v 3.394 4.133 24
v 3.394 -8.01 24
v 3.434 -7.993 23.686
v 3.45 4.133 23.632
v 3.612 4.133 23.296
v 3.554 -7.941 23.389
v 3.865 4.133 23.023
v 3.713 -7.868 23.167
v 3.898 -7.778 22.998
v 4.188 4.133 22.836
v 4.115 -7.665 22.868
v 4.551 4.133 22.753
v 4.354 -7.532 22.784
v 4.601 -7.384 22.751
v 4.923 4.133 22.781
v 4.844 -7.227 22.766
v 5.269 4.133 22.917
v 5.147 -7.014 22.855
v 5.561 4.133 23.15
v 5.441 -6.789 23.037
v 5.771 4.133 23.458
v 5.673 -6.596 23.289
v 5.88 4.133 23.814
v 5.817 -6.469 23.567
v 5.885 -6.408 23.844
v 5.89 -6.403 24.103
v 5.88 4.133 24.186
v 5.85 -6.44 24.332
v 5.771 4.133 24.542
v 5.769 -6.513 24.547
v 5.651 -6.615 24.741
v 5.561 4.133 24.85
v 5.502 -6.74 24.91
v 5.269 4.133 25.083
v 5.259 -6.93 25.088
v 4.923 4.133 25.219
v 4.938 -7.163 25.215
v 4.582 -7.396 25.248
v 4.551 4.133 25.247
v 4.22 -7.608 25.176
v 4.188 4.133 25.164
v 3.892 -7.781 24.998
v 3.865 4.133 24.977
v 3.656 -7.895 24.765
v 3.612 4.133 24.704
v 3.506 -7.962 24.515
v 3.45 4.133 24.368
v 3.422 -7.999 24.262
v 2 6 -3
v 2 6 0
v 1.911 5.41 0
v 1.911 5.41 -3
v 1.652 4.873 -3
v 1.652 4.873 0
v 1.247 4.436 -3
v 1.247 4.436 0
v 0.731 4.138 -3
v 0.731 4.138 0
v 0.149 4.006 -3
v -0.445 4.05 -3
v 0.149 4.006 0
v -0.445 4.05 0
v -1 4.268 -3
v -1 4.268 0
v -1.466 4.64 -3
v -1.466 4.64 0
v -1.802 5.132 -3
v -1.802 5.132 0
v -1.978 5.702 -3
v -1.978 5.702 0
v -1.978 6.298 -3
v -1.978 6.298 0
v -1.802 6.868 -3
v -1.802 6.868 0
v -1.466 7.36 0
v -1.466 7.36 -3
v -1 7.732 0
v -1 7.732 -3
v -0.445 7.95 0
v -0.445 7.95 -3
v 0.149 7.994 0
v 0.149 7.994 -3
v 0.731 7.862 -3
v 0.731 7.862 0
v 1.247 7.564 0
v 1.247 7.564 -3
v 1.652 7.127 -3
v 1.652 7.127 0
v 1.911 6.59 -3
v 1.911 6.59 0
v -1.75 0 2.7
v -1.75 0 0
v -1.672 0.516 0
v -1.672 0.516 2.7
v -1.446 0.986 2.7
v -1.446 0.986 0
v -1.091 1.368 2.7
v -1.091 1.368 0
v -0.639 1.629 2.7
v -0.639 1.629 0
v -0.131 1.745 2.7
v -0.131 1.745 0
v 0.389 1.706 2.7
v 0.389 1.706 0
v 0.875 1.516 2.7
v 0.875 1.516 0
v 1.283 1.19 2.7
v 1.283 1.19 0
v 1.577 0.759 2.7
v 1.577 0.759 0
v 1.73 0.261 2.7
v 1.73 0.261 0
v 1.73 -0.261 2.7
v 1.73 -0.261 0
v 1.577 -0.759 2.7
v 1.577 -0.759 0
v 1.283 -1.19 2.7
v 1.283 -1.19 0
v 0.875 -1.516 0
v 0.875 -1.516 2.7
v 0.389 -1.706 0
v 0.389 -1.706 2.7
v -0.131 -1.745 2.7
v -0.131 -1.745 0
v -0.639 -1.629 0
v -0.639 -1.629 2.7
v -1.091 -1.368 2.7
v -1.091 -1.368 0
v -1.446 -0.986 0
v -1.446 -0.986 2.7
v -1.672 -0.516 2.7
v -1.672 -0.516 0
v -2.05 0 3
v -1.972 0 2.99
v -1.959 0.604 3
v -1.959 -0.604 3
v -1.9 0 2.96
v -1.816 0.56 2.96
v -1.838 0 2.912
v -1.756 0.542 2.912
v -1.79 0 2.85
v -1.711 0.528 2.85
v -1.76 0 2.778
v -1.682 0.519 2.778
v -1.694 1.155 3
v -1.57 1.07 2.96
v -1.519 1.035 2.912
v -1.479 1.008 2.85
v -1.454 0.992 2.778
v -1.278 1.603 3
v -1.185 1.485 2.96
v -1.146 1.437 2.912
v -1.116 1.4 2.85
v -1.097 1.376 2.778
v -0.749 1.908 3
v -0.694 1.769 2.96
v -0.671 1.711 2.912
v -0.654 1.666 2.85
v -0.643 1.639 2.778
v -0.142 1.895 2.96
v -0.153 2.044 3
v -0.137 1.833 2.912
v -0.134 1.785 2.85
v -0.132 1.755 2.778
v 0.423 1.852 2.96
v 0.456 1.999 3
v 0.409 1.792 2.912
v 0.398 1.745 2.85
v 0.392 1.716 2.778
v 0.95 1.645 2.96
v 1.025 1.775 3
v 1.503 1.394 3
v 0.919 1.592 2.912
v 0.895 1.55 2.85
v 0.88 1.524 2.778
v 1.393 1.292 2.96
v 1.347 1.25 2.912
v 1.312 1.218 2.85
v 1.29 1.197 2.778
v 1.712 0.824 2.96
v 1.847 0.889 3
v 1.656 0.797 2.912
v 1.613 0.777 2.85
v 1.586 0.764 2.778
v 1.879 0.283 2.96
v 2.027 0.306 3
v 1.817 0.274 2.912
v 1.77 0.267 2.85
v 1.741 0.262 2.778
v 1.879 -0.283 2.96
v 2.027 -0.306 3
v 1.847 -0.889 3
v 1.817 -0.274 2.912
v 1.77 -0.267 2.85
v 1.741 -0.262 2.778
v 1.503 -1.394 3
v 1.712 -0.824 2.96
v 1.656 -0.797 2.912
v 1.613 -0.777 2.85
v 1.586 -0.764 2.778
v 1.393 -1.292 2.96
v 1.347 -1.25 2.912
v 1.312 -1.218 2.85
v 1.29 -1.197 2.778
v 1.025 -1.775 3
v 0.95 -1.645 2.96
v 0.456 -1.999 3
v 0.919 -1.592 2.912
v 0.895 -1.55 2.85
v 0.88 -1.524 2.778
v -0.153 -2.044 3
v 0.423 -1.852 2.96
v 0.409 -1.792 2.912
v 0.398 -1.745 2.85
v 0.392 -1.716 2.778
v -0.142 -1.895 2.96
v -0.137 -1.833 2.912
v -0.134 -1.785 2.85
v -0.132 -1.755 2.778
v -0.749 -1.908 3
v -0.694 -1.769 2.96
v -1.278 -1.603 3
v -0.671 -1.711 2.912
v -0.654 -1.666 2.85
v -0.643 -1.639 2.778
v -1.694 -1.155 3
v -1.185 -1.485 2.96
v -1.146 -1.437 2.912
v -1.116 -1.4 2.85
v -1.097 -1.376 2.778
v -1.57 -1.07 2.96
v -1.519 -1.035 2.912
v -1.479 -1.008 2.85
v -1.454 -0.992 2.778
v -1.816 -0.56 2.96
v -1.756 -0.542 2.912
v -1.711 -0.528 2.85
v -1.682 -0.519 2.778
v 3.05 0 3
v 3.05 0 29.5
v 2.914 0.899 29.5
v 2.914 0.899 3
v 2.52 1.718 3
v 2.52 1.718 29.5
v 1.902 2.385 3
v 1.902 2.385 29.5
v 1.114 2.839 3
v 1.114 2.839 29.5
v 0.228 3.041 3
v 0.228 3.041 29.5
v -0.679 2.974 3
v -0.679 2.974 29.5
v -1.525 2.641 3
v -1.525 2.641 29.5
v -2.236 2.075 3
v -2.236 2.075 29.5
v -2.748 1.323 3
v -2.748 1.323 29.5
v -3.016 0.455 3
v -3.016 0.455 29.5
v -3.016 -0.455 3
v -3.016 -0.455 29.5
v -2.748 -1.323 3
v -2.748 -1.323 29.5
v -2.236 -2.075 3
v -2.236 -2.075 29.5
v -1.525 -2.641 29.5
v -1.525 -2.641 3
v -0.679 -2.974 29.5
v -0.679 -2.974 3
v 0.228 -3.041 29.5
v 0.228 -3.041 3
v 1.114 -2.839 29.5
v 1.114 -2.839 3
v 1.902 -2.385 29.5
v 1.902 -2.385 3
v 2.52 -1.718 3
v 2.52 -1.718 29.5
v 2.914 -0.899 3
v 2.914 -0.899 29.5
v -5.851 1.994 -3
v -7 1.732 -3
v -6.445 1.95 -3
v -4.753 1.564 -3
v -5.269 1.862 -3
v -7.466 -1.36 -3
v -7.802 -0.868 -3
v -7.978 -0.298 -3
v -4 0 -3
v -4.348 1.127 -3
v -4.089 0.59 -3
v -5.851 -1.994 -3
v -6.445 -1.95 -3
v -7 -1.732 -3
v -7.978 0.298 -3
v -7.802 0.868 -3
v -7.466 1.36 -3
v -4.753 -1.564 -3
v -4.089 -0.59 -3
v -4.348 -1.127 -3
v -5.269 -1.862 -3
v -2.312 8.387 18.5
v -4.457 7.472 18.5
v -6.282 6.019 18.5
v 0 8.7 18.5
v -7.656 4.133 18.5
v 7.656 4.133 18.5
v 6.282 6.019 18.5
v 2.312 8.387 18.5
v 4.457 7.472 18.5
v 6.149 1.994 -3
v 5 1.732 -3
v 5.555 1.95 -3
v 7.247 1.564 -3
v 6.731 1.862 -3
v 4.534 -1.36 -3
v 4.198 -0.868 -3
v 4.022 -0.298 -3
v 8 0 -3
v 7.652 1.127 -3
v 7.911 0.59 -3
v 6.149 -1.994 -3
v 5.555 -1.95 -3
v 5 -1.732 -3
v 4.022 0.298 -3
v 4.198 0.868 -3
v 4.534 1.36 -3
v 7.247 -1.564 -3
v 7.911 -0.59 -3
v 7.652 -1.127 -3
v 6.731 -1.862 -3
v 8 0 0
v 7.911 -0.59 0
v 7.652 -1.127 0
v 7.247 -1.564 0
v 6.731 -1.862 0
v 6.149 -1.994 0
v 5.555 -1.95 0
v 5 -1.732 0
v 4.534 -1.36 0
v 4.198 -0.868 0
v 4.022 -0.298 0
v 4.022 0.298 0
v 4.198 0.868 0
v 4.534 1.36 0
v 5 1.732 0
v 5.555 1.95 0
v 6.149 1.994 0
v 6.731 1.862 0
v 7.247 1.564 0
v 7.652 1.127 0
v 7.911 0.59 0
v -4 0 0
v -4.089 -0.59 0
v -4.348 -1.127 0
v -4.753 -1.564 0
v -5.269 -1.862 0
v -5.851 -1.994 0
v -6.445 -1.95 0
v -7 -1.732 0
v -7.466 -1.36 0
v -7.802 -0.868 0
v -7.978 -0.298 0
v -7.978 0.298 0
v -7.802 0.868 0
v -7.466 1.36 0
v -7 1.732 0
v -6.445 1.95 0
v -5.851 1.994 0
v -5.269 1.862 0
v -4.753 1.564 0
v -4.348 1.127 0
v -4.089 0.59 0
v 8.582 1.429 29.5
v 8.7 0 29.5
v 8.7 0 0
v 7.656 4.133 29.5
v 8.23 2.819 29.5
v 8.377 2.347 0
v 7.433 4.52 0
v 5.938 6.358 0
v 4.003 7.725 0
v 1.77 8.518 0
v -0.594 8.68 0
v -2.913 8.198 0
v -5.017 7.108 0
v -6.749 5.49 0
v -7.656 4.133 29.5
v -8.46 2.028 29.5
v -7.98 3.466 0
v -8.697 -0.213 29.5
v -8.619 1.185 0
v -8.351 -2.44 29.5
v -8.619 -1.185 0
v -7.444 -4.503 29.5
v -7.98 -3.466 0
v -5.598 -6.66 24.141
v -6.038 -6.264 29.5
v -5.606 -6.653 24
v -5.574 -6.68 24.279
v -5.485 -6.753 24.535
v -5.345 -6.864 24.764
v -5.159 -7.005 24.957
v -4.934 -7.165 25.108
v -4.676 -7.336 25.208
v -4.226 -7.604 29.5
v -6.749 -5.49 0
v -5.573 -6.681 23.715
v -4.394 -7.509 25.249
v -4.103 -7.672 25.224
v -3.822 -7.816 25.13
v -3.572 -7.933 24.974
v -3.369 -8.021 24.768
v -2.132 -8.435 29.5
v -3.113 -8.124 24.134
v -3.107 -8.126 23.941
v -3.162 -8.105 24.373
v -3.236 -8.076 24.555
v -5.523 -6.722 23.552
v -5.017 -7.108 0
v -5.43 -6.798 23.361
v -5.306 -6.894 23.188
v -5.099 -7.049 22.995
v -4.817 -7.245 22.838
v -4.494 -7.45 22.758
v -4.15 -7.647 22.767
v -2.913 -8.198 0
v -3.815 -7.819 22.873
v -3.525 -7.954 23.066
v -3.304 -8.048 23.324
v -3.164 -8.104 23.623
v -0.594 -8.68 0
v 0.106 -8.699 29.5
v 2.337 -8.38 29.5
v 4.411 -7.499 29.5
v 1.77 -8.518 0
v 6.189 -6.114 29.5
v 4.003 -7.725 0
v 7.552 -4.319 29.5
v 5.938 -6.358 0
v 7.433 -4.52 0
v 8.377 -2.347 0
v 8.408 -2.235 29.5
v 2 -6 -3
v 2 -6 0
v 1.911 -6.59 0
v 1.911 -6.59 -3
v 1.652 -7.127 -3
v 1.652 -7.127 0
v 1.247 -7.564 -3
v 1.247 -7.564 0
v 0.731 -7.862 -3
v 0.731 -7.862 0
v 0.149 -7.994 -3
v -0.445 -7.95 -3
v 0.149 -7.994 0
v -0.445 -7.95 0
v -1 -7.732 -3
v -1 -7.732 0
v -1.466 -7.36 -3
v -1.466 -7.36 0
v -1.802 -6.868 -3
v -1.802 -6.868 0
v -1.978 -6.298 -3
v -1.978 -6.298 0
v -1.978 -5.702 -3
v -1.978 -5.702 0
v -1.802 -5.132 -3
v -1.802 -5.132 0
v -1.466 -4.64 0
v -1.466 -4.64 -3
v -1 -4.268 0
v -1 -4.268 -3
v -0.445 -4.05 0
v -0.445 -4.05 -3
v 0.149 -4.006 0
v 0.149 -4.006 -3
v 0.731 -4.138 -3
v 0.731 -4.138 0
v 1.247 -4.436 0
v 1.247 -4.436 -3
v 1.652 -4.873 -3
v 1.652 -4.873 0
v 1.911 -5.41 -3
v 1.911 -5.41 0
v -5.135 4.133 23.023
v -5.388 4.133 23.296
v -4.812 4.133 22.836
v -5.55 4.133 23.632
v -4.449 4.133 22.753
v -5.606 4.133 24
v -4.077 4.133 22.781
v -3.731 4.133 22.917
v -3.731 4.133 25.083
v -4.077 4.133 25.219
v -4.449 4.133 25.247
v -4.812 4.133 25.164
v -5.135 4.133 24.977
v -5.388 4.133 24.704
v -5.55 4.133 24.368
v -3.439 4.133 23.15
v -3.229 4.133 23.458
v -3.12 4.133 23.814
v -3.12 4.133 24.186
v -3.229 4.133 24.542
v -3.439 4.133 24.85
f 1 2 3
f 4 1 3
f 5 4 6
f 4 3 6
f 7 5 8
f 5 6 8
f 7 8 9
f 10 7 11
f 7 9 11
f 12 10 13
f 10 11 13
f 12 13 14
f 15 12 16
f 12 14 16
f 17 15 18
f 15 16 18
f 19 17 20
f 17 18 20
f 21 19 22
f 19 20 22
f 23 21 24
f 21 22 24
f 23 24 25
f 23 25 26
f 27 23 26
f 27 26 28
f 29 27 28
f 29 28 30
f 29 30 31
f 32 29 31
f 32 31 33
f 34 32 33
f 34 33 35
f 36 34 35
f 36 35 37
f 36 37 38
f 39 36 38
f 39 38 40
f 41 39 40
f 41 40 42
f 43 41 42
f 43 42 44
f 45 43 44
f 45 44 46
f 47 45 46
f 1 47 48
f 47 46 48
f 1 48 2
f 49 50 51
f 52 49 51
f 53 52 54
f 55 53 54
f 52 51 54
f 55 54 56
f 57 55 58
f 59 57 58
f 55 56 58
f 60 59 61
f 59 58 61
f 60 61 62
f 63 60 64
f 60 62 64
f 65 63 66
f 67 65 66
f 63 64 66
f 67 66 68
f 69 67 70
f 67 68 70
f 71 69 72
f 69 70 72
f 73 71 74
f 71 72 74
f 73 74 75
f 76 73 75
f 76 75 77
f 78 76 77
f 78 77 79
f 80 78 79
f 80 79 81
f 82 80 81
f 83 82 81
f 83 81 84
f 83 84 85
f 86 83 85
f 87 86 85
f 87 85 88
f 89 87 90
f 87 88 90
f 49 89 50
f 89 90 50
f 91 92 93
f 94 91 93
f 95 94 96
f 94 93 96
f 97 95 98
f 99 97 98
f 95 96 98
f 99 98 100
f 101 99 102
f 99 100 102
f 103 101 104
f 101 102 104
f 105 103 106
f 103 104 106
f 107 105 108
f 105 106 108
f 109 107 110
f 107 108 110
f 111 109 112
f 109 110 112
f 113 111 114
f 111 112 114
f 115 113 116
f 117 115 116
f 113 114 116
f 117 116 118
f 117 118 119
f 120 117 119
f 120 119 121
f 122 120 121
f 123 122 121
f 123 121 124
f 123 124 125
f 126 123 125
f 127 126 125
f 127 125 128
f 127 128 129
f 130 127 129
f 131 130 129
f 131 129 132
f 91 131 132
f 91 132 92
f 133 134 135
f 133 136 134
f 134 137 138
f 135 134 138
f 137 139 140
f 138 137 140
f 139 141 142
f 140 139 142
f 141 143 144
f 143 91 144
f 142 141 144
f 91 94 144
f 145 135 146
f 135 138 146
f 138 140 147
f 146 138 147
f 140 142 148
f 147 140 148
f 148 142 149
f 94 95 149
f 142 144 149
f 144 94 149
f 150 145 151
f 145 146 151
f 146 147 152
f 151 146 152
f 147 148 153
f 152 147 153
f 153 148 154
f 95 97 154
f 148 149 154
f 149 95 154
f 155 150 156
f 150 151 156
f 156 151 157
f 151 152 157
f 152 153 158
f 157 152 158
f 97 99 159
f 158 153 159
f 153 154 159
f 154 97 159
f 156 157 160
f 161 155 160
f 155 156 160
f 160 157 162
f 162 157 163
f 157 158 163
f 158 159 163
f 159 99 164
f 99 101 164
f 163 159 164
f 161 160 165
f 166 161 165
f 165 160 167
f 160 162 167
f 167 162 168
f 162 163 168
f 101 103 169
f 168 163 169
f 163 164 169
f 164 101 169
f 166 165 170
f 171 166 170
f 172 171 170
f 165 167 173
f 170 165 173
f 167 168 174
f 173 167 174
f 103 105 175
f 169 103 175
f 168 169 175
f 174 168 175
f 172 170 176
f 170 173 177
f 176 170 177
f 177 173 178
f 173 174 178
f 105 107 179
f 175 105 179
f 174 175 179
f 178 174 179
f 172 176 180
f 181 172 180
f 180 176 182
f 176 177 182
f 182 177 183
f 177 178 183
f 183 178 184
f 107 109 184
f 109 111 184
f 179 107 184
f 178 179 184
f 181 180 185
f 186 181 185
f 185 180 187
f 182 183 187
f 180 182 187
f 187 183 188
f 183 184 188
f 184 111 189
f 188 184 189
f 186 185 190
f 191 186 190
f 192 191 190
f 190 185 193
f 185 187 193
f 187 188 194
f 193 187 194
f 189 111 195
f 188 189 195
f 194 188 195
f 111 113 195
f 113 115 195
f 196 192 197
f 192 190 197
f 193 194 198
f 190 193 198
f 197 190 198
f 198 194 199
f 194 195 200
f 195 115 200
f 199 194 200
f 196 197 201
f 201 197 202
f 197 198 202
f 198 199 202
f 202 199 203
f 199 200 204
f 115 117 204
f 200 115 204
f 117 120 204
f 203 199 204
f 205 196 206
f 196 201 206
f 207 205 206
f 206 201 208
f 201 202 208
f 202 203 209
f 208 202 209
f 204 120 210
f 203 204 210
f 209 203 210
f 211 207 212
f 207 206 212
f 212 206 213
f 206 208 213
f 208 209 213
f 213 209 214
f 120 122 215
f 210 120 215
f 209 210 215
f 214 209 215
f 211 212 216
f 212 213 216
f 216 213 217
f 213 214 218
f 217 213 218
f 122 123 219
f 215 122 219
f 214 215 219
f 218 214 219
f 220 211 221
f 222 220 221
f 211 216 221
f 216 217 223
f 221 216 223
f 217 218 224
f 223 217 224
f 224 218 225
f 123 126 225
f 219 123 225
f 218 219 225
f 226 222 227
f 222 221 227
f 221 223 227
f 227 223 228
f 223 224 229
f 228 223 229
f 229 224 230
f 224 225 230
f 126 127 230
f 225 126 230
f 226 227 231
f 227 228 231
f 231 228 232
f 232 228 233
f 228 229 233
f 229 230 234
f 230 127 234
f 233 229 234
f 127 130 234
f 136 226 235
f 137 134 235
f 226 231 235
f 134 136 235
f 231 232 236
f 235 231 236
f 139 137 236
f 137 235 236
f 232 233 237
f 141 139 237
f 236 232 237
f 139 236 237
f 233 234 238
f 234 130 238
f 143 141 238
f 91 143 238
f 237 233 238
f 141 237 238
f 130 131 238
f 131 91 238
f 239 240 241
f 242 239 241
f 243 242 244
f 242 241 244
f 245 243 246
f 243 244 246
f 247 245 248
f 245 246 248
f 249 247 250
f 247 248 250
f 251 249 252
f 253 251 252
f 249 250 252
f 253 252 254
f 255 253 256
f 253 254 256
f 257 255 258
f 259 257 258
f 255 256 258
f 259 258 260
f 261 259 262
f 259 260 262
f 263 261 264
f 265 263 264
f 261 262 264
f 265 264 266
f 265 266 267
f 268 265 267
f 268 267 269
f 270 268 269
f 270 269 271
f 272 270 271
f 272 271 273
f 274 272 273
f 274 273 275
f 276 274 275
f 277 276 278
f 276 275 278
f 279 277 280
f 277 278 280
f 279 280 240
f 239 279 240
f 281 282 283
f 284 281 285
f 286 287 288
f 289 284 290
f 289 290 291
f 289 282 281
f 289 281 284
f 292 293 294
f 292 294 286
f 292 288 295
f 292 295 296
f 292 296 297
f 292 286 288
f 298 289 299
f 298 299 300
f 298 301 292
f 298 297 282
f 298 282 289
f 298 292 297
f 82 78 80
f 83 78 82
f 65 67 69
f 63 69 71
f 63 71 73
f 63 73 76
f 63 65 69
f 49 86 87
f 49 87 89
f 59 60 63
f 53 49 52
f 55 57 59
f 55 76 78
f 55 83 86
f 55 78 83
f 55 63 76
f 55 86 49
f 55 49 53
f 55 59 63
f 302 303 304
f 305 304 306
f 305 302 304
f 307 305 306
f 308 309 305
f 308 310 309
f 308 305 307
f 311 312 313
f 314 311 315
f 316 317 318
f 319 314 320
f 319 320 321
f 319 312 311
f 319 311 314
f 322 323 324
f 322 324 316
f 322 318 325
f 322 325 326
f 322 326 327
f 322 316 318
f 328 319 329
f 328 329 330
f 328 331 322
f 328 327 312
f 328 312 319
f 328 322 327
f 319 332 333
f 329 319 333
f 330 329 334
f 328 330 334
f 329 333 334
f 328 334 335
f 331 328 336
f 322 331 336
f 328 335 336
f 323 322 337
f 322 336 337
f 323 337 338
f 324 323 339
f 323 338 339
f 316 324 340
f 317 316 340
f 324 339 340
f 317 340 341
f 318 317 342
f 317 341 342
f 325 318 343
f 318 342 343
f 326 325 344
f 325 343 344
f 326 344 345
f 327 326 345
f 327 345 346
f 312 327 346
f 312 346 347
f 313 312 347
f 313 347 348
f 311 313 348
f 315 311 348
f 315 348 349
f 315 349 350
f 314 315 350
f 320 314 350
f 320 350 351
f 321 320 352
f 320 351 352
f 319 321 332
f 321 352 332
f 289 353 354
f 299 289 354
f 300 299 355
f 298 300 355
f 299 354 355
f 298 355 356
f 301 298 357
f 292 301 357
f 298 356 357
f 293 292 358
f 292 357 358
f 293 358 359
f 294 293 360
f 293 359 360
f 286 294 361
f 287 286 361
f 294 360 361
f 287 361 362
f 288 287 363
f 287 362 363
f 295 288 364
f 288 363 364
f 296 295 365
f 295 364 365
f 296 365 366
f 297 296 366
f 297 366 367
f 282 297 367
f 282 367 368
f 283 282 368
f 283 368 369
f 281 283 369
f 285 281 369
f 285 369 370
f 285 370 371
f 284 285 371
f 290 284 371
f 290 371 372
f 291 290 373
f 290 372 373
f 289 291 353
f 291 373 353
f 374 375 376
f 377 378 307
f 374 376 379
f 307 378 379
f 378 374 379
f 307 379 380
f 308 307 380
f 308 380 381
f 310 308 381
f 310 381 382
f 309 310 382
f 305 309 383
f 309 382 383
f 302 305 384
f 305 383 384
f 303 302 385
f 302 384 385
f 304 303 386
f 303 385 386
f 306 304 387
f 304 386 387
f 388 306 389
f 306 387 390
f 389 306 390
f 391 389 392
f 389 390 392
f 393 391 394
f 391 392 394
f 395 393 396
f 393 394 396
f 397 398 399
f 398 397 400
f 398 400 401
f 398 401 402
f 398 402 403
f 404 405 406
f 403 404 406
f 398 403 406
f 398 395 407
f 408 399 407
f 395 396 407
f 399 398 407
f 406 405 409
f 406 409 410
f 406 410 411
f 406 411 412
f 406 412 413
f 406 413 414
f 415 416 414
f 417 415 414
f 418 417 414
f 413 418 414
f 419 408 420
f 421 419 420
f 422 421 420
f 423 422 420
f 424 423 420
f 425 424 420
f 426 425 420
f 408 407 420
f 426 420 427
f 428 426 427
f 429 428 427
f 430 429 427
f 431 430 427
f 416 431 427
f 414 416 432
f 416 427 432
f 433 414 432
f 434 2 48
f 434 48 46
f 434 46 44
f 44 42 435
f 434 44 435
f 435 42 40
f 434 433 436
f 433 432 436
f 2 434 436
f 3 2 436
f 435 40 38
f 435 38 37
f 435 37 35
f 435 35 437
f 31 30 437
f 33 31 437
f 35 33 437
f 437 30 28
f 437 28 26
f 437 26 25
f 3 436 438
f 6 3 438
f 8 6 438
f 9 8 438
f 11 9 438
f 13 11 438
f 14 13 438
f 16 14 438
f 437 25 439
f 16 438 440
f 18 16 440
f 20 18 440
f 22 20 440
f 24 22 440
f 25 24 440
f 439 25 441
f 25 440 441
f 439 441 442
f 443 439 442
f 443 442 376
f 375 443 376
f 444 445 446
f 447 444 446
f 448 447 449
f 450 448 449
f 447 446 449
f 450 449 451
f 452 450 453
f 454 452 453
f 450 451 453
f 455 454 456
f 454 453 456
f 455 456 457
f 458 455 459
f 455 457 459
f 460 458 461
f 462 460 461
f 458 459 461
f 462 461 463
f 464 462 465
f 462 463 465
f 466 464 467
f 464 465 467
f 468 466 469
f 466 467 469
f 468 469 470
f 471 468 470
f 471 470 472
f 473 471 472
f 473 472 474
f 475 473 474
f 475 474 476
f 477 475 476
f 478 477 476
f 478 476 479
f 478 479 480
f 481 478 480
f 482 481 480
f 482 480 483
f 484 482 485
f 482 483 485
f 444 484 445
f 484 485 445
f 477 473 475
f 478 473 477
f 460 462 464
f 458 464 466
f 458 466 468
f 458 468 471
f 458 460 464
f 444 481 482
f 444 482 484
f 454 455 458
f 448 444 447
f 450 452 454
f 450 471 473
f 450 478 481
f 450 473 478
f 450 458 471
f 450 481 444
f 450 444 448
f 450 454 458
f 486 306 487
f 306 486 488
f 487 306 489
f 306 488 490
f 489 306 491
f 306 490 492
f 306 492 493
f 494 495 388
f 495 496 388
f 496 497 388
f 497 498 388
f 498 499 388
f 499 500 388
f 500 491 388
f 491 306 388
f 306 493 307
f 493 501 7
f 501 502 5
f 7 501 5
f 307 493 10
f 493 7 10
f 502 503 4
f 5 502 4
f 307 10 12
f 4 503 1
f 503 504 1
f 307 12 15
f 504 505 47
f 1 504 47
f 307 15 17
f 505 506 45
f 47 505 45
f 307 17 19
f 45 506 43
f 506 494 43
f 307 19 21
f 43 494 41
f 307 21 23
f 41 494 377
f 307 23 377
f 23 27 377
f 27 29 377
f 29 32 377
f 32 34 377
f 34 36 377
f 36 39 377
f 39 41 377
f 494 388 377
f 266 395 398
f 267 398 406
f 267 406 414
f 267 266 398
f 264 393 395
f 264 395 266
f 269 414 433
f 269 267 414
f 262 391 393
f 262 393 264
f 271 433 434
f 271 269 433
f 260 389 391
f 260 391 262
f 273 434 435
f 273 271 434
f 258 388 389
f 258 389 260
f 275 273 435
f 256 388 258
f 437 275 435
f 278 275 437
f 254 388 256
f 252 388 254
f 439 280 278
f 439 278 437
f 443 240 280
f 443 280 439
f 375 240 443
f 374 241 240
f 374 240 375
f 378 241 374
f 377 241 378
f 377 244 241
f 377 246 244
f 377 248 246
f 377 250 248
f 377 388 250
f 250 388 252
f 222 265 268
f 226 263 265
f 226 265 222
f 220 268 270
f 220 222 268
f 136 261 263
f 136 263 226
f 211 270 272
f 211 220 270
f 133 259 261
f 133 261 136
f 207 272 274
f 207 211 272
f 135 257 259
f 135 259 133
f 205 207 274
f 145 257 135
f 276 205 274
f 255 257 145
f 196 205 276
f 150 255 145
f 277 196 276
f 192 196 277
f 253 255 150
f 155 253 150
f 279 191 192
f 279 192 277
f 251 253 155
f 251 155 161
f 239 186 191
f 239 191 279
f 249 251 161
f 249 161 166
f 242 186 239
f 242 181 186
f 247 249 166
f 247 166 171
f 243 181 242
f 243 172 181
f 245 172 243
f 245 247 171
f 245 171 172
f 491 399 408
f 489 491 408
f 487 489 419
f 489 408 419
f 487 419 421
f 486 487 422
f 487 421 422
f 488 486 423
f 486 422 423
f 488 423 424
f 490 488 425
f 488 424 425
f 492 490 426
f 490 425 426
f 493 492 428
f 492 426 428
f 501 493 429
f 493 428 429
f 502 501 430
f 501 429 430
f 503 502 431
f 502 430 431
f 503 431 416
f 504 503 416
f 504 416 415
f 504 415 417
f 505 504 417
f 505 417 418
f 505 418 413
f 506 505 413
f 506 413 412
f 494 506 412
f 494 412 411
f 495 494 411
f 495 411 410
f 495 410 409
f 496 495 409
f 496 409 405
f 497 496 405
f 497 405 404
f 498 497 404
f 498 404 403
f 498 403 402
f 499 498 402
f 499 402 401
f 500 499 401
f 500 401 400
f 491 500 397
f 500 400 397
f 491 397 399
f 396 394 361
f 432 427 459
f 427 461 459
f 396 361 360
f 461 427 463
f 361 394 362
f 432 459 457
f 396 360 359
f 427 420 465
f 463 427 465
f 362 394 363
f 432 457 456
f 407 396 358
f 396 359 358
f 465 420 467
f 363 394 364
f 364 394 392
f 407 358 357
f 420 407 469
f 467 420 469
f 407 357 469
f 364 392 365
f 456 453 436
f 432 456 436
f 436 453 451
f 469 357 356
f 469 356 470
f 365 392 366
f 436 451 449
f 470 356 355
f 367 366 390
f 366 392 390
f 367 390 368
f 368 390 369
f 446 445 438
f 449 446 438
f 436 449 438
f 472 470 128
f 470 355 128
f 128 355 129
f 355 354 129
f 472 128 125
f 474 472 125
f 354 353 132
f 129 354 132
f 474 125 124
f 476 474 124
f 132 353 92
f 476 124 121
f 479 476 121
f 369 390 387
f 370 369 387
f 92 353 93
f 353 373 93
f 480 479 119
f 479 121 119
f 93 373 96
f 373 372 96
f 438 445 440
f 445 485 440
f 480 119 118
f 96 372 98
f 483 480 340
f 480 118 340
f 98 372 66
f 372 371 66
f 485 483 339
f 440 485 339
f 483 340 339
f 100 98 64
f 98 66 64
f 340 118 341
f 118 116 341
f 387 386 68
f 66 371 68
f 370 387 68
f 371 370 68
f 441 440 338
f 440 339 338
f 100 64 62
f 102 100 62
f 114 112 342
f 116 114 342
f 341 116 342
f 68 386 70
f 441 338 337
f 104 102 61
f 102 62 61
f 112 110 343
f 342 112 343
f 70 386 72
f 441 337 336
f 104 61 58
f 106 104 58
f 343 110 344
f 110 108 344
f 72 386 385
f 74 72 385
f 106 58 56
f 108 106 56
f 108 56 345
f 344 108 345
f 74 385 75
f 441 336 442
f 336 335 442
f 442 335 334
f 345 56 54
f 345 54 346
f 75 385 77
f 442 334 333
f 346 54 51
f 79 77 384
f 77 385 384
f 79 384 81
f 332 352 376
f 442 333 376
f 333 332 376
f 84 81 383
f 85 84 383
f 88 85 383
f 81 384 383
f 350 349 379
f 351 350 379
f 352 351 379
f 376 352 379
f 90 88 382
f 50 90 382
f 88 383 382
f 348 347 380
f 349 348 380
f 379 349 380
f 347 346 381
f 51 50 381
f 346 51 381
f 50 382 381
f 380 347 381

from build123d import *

# Parameters (mm, degrees)
SKETCH1_R                   = 8.7
BOSS_EXTRUDE1_DEPTH         = 29.5
SKETCH5_R                   = 1.75
CUT_EXTRUDE1_DEPTH          = 32.962947298
SKETCH6_R                   = 3.05
CUT_EXTRUDE3_DEPTH          = 26.5
SKETCH2_W                   = 17
SKETCH2_H                   = 4.566888769
CUT_EXTRUDE4_DEPTH          = 11
FILLET1_R                   = 0.3
TAP_DRILL_FOR_M3X0_5_TAP1_D = 2.5
SKETCH4_R                   = 2
BOSS_EXTRUDE2_DEPTH         = 3


with BuildPart() as part:
    # Sketch1 → Boss-Extrude1 (new body)
    with BuildSketch(Plane.XY):
        Circle(SKETCH1_R)
    extrude(amount=BOSS_EXTRUDE1_DEPTH)

    # Sketch5 → Cut-Extrude1 (cut, through all)
    with BuildSketch(Plane(origin=(0, 0, 0), x_dir=(-1, 0, 0), z_dir=(0, 0, -1))):
        Circle(SKETCH5_R)
    extrude(amount=-CUT_EXTRUDE1_DEPTH, mode=Mode.SUBTRACT)

    # Sketch6 → Cut-Extrude3 (cut)
    with BuildSketch(Plane.XY.offset(29.5)):
        Circle(SKETCH6_R)
    extrude(amount=-CUT_EXTRUDE3_DEPTH, mode=Mode.SUBTRACT)

    # Sketch2 → Cut-Extrude4 (cut)
    with BuildSketch(Plane.XY.offset(29.5)):
        with Locations((0.844453543, 6.416555616)):
            Rectangle(SKETCH2_W, SKETCH2_H)
    extrude(amount=-CUT_EXTRUDE4_DEPTH, mode=Mode.SUBTRACT)

    # Fillet1
    fillet1_edges = [part.edges().sort_by_distance(p)[0] for p in [
        (1.75, 0, 3),
    ]]
    fillet(fillet1_edges, radius=FILLET1_R)

    # Tap Drill for M3x0.5 Tap1 (through all)
    with Locations(Plane(origin=(0, 4.133111231, 0), x_dir=(1, 0, 0), z_dir=(0, 1, 0))):
        with Locations((4.644453543, -24), (-4.355546457, -24)):
            Hole(TAP_DRILL_FOR_M3X0_5_TAP1_D / 2)

    # Sketch4 → Boss-Extrude2 (add)
    with BuildSketch(Plane(origin=(0, 0, 0), x_dir=(-1, 0, 0), z_dir=(0, 0, -1))):
        with Locations(Location((0, 6, 0), (0, 0, 180))):
            Circle(SKETCH4_R)
        with Locations(Location((6, 0, 0), (0, 0, 180))):
            Circle(SKETCH4_R)
        with Locations(Location((0, -6, 0), (0, 0, 180))):
            Circle(SKETCH4_R)
        with Locations(Location((-6, 0, 0), (0, 0, 180))):
            Circle(SKETCH4_R)
    extrude(amount=BOSS_EXTRUDE2_DEPTH)


solid = part.part
